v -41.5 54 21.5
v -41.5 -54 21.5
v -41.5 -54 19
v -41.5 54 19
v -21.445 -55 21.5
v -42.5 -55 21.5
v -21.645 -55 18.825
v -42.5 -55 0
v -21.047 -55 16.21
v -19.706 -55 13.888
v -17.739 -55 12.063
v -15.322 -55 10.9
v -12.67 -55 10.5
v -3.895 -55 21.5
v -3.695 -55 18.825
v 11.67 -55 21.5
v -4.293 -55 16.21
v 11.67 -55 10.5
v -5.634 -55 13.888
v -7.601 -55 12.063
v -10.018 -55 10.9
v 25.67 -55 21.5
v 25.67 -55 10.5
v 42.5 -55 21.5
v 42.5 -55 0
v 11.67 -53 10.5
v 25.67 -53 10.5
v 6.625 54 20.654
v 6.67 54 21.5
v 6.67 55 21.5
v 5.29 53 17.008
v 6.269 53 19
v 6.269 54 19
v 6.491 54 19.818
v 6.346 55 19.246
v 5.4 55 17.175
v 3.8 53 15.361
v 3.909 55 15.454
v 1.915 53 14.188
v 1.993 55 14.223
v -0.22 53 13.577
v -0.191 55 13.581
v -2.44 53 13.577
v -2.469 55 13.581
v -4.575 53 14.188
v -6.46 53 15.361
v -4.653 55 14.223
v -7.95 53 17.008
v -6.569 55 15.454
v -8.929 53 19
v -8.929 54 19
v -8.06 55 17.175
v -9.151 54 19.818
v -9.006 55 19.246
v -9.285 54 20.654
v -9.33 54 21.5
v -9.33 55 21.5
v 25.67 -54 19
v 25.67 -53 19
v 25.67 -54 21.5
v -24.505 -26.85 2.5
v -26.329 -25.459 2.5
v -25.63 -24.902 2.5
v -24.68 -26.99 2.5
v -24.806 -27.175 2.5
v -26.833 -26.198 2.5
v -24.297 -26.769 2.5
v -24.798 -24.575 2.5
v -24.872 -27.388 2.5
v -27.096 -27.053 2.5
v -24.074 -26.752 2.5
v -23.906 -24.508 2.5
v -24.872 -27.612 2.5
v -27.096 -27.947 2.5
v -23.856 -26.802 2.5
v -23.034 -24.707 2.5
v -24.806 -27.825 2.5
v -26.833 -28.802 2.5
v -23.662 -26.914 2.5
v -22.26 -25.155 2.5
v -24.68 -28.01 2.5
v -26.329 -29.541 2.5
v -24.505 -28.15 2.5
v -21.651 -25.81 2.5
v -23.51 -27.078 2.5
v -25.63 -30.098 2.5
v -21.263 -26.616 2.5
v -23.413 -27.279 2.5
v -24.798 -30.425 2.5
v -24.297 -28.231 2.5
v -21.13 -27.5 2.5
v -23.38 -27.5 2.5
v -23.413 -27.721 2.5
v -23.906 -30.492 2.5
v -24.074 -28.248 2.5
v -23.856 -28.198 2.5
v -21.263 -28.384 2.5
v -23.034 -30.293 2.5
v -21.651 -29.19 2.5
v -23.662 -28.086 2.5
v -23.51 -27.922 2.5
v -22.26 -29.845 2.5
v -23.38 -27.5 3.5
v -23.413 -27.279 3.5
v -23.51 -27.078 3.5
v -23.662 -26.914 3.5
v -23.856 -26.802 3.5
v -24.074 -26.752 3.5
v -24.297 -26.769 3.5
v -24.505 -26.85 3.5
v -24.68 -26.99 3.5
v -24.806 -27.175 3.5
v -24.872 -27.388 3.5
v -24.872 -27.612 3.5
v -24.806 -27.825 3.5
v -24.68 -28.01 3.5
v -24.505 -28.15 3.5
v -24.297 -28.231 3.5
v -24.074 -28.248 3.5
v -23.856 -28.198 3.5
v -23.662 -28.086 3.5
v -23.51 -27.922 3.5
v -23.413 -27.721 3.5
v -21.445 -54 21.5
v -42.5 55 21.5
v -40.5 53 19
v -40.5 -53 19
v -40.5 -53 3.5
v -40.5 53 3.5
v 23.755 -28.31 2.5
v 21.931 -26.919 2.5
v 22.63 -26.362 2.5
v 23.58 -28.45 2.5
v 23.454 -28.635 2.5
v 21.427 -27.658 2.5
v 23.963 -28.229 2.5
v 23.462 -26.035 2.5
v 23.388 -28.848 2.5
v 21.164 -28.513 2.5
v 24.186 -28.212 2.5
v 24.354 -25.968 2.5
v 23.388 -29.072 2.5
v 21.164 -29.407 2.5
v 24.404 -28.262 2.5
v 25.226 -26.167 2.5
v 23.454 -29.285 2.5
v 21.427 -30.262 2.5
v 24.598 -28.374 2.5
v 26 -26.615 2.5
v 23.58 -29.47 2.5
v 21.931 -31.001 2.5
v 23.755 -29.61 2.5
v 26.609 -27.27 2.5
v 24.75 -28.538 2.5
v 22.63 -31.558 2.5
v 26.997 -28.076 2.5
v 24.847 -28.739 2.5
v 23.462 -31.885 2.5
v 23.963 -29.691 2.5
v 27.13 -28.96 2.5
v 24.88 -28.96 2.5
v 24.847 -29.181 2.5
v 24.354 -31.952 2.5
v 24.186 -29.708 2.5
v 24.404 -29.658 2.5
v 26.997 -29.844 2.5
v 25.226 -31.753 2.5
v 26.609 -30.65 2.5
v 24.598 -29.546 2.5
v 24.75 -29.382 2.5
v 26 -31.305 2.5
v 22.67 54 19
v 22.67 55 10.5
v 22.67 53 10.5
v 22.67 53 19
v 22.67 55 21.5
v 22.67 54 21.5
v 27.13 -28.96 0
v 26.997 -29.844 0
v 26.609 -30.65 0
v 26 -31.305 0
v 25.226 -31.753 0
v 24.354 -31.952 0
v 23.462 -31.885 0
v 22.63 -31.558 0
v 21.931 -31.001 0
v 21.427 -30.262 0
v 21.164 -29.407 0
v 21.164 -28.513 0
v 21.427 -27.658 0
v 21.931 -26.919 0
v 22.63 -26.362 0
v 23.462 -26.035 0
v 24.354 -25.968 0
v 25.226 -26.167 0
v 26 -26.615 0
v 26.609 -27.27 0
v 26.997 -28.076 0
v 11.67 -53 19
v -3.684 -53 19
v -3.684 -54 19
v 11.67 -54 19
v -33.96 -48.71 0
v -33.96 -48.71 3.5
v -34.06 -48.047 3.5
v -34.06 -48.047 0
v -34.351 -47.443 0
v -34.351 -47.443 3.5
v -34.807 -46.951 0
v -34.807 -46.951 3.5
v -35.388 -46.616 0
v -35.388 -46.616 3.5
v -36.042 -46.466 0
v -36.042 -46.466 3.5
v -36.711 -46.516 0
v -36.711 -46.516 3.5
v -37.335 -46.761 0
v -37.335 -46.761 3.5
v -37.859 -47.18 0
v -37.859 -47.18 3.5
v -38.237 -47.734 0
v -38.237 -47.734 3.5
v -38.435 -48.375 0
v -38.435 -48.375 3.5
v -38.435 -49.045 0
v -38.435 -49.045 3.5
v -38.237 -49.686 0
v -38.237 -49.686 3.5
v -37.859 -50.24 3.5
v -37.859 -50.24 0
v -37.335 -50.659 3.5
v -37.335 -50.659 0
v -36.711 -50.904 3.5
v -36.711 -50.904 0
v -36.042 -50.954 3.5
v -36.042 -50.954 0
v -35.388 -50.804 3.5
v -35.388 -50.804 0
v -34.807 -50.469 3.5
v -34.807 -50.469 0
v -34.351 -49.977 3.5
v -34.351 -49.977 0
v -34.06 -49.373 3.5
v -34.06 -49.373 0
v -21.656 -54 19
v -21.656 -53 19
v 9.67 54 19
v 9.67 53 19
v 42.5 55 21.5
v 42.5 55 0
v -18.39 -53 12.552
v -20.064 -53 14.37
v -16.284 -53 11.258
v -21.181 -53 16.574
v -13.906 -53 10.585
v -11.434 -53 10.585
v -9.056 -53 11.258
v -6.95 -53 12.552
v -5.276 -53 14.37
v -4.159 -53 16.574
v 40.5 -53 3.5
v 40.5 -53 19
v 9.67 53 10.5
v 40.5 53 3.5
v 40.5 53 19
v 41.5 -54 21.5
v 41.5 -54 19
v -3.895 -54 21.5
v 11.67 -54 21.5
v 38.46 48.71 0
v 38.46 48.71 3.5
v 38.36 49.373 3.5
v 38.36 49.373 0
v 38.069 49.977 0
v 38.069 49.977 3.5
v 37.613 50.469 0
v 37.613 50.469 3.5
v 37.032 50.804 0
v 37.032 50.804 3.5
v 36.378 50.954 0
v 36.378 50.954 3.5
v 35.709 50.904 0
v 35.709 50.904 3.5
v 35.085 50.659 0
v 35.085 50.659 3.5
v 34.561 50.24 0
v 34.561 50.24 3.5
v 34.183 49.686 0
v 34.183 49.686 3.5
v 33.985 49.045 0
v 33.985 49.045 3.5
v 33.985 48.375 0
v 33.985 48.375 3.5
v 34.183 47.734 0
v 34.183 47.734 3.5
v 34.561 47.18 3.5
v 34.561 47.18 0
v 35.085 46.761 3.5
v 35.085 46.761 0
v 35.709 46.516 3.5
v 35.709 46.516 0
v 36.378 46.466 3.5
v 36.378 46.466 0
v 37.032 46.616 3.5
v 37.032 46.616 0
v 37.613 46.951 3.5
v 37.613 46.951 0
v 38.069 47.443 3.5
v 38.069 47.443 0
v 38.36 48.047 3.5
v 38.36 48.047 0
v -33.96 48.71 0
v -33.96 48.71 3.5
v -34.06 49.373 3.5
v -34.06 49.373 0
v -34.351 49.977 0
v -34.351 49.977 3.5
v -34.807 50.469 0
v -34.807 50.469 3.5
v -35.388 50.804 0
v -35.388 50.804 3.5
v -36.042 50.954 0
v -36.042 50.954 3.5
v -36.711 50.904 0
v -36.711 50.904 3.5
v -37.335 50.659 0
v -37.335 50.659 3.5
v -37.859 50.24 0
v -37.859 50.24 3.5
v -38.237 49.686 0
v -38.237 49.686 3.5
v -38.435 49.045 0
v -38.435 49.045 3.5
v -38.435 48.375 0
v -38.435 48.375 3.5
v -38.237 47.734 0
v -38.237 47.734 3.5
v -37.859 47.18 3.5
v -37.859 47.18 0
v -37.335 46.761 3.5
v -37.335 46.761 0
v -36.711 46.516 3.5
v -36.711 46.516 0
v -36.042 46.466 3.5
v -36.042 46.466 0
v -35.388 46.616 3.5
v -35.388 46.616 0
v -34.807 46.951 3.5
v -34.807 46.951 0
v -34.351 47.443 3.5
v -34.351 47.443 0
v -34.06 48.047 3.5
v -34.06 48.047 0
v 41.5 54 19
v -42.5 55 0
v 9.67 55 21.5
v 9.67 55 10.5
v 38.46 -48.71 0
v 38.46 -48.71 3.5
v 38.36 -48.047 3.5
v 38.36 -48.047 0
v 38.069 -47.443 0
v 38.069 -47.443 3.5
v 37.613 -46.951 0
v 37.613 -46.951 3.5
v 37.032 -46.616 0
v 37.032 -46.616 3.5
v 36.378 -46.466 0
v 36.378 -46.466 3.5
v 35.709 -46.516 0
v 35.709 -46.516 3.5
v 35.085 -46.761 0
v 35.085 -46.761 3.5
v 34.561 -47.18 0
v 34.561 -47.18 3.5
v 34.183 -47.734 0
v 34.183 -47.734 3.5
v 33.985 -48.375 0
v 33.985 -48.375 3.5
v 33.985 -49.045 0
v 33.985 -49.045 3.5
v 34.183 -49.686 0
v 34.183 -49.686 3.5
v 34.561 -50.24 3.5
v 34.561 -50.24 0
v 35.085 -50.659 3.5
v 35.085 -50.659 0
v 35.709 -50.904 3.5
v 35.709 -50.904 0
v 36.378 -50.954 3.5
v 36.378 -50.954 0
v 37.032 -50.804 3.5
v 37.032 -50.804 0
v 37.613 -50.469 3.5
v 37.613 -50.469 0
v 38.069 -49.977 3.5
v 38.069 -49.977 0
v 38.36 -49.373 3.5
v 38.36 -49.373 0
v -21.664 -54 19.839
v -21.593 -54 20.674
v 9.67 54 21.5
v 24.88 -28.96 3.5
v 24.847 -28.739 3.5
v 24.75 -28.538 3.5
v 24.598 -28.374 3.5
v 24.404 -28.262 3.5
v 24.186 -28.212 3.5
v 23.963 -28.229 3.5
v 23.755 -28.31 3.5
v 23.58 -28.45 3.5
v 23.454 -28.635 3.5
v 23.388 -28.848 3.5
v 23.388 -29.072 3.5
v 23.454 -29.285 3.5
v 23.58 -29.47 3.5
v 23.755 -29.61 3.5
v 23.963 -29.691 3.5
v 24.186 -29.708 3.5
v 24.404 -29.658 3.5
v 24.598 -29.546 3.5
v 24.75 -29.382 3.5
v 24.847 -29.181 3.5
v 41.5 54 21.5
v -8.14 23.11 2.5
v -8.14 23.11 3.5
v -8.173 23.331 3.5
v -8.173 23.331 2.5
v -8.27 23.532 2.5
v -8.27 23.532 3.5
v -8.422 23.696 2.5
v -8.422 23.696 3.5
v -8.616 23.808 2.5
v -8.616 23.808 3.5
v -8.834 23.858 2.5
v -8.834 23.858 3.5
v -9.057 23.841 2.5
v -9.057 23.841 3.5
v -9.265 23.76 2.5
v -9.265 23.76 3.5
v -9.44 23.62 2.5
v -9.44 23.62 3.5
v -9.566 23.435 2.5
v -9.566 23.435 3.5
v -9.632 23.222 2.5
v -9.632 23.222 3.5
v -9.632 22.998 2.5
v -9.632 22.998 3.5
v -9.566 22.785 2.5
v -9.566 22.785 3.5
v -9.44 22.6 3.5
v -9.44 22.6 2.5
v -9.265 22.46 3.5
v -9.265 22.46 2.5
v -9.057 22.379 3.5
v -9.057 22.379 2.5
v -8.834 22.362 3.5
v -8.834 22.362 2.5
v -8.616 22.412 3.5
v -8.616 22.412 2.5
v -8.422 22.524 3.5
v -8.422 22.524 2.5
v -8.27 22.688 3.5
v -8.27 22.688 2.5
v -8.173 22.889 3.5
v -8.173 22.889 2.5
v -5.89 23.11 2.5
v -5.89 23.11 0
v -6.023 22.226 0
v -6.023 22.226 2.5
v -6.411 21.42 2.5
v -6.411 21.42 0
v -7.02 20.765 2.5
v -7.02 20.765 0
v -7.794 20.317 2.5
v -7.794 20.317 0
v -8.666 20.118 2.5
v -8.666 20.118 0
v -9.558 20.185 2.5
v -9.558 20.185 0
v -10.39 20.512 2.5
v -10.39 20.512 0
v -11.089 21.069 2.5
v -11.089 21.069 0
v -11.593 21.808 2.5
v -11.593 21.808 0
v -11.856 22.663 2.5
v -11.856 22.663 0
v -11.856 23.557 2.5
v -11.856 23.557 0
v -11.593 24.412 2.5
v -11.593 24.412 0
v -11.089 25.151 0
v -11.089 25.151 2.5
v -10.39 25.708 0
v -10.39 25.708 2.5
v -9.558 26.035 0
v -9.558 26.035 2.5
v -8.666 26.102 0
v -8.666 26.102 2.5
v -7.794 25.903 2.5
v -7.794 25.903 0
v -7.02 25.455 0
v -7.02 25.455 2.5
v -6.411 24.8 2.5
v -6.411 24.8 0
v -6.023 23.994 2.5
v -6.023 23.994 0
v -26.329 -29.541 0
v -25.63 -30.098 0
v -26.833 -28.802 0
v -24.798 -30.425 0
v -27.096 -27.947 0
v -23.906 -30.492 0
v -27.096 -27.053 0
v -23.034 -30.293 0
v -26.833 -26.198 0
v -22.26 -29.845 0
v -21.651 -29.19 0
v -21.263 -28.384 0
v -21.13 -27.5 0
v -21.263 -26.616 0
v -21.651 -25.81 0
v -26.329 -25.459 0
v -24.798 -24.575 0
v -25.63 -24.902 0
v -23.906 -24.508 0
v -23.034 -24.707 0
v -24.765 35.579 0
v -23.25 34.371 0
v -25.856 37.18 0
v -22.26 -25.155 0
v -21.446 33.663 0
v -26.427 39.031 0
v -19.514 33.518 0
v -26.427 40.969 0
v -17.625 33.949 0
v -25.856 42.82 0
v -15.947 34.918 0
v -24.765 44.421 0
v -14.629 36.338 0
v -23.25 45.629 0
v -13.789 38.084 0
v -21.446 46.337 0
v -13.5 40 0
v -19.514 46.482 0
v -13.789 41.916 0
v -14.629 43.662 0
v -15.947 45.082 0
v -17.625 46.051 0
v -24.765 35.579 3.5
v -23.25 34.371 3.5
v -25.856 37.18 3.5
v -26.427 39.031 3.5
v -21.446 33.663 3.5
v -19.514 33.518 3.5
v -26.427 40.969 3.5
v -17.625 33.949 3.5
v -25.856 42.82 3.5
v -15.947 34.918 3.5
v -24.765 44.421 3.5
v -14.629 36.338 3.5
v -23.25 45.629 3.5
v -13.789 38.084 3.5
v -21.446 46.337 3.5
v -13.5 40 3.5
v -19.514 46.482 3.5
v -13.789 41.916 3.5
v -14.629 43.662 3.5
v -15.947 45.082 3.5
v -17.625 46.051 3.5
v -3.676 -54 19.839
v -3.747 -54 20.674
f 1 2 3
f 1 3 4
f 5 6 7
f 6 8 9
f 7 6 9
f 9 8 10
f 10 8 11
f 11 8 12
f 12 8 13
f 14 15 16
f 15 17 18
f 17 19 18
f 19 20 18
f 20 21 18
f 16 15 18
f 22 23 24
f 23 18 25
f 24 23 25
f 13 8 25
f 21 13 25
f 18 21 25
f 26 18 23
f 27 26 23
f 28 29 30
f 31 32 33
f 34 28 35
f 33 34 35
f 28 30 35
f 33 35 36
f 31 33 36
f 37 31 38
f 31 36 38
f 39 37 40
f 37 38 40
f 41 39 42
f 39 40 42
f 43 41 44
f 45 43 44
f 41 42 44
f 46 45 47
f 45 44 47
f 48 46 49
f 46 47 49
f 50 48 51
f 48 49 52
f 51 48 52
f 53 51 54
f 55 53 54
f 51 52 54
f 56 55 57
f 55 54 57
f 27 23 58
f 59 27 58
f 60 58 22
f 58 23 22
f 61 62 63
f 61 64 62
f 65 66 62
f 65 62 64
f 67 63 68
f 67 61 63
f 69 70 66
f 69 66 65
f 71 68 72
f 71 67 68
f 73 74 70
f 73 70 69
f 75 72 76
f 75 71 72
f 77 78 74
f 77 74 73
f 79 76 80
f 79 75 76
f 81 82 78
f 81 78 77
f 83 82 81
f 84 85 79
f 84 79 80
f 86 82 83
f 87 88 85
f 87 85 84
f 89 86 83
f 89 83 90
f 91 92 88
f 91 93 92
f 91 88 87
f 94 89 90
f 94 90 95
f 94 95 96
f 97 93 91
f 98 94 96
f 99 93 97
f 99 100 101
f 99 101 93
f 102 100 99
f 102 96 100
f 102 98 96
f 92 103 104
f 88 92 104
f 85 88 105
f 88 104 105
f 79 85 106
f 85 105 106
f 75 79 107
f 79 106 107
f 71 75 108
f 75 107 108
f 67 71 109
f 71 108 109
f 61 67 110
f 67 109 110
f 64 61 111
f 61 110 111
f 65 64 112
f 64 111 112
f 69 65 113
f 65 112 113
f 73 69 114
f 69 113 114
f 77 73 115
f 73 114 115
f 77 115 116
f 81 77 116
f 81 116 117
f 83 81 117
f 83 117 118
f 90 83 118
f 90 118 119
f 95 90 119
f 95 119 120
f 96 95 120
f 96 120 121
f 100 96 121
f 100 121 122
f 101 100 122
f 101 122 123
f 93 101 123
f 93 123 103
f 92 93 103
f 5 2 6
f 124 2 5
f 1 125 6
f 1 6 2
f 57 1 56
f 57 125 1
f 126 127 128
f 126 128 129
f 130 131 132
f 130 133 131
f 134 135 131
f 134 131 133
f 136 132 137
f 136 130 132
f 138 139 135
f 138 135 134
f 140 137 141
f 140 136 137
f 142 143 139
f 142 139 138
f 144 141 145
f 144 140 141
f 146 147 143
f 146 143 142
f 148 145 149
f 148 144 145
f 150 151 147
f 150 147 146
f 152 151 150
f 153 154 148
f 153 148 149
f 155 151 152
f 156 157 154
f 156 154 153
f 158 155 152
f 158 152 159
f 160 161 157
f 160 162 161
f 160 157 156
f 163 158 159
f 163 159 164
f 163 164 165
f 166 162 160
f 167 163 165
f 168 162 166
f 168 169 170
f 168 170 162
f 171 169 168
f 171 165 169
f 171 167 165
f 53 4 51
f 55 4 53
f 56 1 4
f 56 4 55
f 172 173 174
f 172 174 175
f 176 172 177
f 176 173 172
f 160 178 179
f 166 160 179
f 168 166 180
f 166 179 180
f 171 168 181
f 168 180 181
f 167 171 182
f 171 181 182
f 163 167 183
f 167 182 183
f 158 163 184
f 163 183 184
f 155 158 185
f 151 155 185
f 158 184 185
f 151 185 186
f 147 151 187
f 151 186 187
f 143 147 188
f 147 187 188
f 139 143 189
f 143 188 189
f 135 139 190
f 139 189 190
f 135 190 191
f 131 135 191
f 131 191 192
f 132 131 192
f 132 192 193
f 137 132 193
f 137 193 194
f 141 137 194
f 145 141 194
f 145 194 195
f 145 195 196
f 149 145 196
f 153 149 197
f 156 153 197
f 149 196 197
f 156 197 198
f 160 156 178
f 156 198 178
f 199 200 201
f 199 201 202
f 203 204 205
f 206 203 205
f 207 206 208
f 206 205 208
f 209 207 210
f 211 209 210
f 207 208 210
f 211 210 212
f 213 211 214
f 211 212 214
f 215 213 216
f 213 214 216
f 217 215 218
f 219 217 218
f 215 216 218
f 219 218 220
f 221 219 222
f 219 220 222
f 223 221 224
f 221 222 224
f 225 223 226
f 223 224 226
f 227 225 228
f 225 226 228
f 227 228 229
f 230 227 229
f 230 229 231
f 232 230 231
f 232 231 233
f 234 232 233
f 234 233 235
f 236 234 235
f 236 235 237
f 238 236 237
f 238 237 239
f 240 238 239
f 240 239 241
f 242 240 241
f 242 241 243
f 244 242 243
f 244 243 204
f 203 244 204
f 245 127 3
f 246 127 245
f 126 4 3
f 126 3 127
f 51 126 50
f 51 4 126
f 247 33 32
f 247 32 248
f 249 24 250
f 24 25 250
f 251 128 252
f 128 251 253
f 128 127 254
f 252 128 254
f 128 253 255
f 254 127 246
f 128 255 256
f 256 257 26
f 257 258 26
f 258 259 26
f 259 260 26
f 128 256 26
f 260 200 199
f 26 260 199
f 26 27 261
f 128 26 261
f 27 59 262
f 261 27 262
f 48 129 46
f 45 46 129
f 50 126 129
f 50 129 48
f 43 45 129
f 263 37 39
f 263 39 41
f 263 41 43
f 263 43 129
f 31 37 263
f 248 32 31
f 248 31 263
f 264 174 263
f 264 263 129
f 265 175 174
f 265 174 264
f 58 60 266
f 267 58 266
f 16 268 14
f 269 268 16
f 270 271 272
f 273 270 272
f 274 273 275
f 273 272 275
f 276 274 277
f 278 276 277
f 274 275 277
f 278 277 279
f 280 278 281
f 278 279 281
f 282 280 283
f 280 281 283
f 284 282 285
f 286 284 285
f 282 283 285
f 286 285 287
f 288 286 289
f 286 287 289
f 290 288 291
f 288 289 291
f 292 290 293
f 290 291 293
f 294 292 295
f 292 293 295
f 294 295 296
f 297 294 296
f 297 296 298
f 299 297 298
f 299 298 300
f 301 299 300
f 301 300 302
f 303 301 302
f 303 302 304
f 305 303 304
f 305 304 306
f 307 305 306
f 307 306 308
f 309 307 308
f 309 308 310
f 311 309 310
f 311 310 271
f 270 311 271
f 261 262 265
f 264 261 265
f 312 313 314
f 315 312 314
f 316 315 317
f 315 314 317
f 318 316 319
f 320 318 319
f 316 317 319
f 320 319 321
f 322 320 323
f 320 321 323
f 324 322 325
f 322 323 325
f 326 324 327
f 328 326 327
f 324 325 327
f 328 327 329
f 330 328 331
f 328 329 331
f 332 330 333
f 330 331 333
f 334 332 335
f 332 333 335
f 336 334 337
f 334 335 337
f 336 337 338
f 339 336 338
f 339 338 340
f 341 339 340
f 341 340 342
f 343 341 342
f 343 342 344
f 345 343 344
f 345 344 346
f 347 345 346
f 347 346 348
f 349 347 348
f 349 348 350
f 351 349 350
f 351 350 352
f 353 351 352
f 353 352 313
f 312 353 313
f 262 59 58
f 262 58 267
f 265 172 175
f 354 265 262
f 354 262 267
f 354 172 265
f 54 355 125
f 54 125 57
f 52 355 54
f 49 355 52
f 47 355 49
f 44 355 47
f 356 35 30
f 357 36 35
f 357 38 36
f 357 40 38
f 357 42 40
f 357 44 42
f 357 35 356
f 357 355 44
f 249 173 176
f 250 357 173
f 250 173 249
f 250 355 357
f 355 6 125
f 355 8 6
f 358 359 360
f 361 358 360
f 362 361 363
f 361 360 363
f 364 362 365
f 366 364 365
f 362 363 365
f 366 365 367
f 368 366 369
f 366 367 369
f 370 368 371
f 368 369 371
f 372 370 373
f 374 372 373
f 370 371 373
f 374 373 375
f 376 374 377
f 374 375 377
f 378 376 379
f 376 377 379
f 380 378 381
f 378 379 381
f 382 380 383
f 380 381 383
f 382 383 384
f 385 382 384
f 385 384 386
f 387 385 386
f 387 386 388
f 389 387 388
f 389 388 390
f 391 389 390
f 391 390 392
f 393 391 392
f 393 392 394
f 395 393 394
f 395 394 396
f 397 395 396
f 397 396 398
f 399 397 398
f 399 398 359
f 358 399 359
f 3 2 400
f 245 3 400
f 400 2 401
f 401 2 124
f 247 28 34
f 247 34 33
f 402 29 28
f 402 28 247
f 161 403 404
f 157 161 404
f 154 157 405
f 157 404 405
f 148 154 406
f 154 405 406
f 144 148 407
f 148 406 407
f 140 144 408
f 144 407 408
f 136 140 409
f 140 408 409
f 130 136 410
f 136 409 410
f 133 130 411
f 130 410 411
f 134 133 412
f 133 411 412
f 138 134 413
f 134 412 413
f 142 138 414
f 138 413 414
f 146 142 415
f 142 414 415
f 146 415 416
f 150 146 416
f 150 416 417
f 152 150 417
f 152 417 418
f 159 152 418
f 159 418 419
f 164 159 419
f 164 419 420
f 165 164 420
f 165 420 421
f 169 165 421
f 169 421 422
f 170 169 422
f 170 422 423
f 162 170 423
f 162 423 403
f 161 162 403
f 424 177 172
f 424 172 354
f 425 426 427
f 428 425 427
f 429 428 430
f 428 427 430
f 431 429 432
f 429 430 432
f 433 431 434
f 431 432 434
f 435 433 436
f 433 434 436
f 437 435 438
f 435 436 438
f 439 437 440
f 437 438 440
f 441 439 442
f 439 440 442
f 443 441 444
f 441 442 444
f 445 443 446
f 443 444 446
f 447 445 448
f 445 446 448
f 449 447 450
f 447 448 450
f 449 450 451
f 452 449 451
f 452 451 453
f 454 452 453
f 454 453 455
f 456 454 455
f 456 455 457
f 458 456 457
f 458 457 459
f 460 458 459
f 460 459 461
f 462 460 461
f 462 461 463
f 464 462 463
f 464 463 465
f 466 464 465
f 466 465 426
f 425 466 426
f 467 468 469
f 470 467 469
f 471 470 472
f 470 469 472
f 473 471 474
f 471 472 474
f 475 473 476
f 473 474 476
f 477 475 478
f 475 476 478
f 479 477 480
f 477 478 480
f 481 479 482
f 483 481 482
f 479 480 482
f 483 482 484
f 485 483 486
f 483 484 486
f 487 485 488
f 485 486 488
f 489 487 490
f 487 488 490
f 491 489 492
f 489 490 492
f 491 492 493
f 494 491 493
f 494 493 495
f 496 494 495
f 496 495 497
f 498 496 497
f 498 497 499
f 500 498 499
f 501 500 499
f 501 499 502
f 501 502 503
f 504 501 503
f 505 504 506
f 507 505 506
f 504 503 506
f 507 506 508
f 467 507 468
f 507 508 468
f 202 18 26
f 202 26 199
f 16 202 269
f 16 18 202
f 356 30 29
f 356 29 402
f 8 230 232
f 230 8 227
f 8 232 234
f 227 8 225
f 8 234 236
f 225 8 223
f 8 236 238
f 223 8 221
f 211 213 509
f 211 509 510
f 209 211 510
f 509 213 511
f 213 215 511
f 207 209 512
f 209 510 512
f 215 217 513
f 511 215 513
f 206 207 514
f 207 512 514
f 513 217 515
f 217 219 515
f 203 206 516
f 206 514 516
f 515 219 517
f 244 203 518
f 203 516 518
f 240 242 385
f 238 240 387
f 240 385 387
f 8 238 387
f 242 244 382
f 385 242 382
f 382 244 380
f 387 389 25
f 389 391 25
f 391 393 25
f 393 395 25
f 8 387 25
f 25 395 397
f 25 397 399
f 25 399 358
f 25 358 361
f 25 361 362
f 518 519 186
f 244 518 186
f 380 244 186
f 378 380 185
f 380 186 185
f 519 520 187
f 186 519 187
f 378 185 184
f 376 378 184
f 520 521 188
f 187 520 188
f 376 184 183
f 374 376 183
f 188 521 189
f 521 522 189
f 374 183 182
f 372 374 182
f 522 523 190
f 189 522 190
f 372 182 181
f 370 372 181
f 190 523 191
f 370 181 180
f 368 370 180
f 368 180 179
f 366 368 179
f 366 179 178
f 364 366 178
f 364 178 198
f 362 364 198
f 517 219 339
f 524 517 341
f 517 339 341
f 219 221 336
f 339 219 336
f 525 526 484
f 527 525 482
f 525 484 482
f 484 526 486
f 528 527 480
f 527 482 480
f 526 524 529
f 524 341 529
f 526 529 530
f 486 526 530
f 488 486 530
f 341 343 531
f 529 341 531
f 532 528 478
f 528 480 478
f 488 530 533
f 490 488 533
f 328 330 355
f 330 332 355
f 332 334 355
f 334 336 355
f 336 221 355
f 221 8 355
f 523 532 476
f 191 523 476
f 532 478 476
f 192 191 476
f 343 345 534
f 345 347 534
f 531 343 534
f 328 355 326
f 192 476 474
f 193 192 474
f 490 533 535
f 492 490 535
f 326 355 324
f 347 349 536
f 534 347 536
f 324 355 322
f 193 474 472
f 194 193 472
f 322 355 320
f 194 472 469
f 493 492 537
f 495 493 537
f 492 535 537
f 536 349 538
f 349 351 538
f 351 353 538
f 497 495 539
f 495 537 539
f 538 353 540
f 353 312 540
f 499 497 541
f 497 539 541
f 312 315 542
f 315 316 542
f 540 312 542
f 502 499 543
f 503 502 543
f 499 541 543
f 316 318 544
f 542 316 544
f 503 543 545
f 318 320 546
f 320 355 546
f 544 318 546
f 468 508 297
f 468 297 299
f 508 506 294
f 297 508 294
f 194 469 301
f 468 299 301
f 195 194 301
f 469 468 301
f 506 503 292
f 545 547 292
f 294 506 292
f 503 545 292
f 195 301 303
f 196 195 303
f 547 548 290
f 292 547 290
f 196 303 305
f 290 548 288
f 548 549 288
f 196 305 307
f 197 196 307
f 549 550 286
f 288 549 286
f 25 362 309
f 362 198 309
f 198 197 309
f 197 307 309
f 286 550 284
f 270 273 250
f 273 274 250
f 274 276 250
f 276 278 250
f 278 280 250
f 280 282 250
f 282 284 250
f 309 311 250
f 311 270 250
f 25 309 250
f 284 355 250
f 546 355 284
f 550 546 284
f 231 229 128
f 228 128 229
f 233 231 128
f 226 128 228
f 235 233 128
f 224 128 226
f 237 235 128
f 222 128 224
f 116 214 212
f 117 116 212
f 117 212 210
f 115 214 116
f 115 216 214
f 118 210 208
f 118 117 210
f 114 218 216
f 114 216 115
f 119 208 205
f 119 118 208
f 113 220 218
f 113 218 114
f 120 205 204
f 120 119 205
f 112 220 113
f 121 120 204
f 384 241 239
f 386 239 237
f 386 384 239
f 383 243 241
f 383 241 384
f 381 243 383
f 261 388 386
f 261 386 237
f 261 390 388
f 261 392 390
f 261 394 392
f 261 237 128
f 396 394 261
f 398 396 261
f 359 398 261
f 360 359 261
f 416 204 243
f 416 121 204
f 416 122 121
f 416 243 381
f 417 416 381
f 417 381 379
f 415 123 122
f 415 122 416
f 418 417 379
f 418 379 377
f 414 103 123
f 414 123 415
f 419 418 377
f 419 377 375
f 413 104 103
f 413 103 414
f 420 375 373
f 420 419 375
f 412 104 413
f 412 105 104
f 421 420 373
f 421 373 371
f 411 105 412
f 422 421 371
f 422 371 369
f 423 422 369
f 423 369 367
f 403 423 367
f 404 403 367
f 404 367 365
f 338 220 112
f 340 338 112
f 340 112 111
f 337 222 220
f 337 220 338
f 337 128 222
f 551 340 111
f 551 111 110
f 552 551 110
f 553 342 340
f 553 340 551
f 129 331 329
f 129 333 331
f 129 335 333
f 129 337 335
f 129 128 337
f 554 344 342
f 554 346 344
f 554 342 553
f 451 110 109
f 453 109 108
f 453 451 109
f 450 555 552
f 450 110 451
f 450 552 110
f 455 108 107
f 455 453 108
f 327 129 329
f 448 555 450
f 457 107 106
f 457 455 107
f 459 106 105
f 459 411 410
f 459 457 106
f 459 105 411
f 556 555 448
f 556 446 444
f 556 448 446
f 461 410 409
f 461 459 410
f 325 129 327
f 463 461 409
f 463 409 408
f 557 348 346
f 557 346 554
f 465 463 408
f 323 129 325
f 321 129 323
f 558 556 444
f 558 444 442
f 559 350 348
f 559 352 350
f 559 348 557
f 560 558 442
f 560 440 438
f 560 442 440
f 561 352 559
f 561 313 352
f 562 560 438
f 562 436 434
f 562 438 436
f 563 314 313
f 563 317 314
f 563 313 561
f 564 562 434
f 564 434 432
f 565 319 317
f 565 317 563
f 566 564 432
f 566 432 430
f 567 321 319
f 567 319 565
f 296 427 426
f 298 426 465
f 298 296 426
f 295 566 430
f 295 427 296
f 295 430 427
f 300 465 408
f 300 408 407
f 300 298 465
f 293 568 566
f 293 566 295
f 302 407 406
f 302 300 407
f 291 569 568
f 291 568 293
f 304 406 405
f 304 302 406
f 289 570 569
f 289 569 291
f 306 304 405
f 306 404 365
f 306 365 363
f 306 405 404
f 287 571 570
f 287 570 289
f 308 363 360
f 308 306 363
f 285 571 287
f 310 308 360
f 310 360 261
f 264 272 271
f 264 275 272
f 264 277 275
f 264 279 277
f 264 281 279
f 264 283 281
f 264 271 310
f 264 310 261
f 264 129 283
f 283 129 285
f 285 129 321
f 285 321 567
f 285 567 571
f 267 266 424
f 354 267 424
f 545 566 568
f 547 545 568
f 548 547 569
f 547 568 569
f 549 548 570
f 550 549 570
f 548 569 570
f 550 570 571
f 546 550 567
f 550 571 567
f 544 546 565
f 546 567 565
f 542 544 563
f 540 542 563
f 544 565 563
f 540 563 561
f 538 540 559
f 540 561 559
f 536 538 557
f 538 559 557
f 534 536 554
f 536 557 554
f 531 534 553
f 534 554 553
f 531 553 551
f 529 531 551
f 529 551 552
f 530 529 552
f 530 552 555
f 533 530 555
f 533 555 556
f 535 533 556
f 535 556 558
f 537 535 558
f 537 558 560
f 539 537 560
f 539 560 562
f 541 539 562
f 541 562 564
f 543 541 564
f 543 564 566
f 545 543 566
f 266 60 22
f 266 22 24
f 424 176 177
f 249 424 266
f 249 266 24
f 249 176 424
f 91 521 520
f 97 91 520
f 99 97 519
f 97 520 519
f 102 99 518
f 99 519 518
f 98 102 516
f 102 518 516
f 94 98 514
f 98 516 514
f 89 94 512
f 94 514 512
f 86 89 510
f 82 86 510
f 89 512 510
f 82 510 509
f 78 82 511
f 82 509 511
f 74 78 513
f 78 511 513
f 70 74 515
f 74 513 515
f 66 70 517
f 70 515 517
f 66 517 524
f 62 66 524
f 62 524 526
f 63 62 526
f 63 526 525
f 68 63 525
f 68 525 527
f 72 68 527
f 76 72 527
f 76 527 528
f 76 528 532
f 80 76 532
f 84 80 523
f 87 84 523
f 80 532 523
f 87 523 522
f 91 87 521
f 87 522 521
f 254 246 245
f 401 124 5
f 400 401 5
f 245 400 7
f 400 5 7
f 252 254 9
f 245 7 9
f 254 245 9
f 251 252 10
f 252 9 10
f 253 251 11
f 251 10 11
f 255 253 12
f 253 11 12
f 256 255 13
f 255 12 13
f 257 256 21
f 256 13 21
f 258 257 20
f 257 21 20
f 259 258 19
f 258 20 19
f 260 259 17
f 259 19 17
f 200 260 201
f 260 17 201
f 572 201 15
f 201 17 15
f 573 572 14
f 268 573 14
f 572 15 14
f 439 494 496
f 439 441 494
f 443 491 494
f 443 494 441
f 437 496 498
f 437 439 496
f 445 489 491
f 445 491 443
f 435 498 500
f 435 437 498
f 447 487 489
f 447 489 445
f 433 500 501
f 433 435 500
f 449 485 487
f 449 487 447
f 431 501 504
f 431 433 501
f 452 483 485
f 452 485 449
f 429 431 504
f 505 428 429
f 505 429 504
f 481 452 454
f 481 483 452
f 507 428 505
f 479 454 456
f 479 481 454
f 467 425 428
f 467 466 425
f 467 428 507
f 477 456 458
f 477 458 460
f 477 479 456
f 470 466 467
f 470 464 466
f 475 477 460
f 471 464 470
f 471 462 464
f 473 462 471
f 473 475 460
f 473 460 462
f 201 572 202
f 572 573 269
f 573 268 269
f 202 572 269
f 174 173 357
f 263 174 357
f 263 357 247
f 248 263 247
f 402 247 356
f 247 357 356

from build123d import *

# Parameters (mm, degrees)
SKETCH_W        = 85
SKETCH_H        = 110
PAD_DEPTH       = 3.5
SKETCH001_R     = 0.75
POCKET_DEPTH    = 9
SKETCH002_R     = 3
POCKET001_DEPTH = 2.5
SKETCH003_W     = 85
SKETCH003_H     = 110
PAD001_DEPTH    = 18
SKETCH004_W     = 81
SKETCH004_H     = 106
POCKET002_DEPTH = 18
SKETCH005_R     = 9
SKETCH005_R_2   = 8
SKETCH005_W     = 14
SKETCH005_H     = 11
SKETCH005_W_2   = 12
SKETCH005_H_2   = 10
POCKET003_DEPTH = 5
SKETCH006_W     = 81
SKETCH006_H     = 106
POCKET004_DEPTH = 18
SKETCH007_R     = 8
SKETCH007_W     = 13
SKETCH007_H     = 11
POCKET005_DEPTH = 5
SKETCH008_R     = 2.25
POCKET006_DEPTH = 5
SKETCH009_W     = 83
SKETCH009_H     = 108
POCKET007_DEPTH = 2.5
SKETCH010_R     = 6.5
POCKET008_DEPTH = 5


with BuildPart() as part:
    # Sketch → Pad (new body)
    with BuildSketch(Plane.XY):
        Rectangle(SKETCH_W, SKETCH_H)
    extrude(amount=PAD_DEPTH)

    # Sketch001 (on Face6 of Pad) → Pocket (cut)
    with BuildSketch(Plane.XY.offset(3.5)):
        with Locations((-24.13, -27.5)):
            Circle(SKETCH001_R)
        with Locations((24.13, -28.96)):
            Circle(SKETCH001_R)
        with Locations((-8.89, 23.11)):
            Circle(SKETCH001_R)
    extrude(amount=-POCKET_DEPTH, mode=Mode.SUBTRACT)

    # Sketch002 (on Face4 of Pocket) → Pocket001 (cut)
    with BuildSketch(Plane(origin=(0, 0, 0), x_dir=(1, 0, 0), z_dir=(0, 0, -1))):
        with Locations((-8.89, -23.11)):
            Circle(SKETCH002_R)
        with Locations((-24.13, 27.5)):
            Circle(SKETCH002_R)
        with Locations((24.13, 28.96)):
            Circle(SKETCH002_R)
    extrude(amount=-POCKET001_DEPTH, mode=Mode.SUBTRACT)

    # Sketch003 (on Face5 of Pocket001) → Pad001 (join)
    with BuildSketch(Plane.XY.offset(3.5)):
        Rectangle(SKETCH003_W, SKETCH003_H)
    extrude(amount=PAD001_DEPTH)

    # Sketch004 (on Face12 of Pad001) → Pocket002 (cut)
    with BuildSketch(Plane.XY.offset(21.5)):
        Rectangle(SKETCH004_W, SKETCH004_H)
    extrude(amount=-POCKET002_DEPTH, mode=Mode.SUBTRACT)

    # Sketch005 (on Face13 of Pocket002) → Pocket003 (cut)
    with BuildSketch(Plane.XZ.offset(55)):
        with Locations((-12.67, 19.5)):
            Circle(SKETCH005_R)
        with Locations((10.303566, 33.5)):
            Circle(SKETCH005_R_2)
        with Locations((18.67, 16)):
            Rectangle(SKETCH005_W, SKETCH005_H)
        with Locations((21.67, 28.5)):
            Rectangle(SKETCH005_W_2, SKETCH005_H_2)
    extrude(amount=-POCKET003_DEPTH, mode=Mode.SUBTRACT)

    # Sketch006 (on Face12 of Pocket003) → Pocket004 (cut)
    with BuildSketch(Plane.XY.offset(21.5)):
        Rectangle(SKETCH006_W, SKETCH006_H)
    extrude(amount=-POCKET004_DEPTH, mode=Mode.SUBTRACT)

    # Sketch007 (on Face5 of Pocket004) → Pocket005 (cut)
    with BuildSketch(Plane(origin=(0, 55, 0), x_dir=(-1, 0, 0), z_dir=(0, 1, 0))):
        with Locations((1.33, 21.5)):
            Circle(SKETCH007_R)
        with Locations((-16.17, 16)):
            Rectangle(SKETCH007_W, SKETCH007_H)
    extrude(amount=-POCKET005_DEPTH, mode=Mode.SUBTRACT)

    # Sketch008 (on Face36 of Pocket005) → Pocket006 (cut)
    with BuildSketch(Plane.XY.offset(3.5)):
        with Locations((-36.21, 48.71)):
            Circle(SKETCH008_R)
        with Locations((36.21, 48.71)):
            Circle(SKETCH008_R)
        with Locations((-36.21, -48.71)):
            Circle(SKETCH008_R)
        with Locations((36.21, -48.71)):
            Circle(SKETCH008_R)
    extrude(amount=-POCKET006_DEPTH, mode=Mode.SUBTRACT)

    # Sketch009 (on Face22 of Pocket006) → Pocket007 (cut)
    with BuildSketch(Plane.XY.offset(21.5)):
        Rectangle(SKETCH009_W, SKETCH009_H)
    extrude(amount=-POCKET007_DEPTH, mode=Mode.SUBTRACT)

    # Sketch010 (on Face24 of Pocket007) → Pocket008 (cut)
    with BuildSketch(Plane.XY.offset(3.5)):
        with Locations((-20, 40)):
            Circle(SKETCH010_R)
    extrude(amount=-POCKET008_DEPTH, mode=Mode.SUBTRACT)


solid = part.part
